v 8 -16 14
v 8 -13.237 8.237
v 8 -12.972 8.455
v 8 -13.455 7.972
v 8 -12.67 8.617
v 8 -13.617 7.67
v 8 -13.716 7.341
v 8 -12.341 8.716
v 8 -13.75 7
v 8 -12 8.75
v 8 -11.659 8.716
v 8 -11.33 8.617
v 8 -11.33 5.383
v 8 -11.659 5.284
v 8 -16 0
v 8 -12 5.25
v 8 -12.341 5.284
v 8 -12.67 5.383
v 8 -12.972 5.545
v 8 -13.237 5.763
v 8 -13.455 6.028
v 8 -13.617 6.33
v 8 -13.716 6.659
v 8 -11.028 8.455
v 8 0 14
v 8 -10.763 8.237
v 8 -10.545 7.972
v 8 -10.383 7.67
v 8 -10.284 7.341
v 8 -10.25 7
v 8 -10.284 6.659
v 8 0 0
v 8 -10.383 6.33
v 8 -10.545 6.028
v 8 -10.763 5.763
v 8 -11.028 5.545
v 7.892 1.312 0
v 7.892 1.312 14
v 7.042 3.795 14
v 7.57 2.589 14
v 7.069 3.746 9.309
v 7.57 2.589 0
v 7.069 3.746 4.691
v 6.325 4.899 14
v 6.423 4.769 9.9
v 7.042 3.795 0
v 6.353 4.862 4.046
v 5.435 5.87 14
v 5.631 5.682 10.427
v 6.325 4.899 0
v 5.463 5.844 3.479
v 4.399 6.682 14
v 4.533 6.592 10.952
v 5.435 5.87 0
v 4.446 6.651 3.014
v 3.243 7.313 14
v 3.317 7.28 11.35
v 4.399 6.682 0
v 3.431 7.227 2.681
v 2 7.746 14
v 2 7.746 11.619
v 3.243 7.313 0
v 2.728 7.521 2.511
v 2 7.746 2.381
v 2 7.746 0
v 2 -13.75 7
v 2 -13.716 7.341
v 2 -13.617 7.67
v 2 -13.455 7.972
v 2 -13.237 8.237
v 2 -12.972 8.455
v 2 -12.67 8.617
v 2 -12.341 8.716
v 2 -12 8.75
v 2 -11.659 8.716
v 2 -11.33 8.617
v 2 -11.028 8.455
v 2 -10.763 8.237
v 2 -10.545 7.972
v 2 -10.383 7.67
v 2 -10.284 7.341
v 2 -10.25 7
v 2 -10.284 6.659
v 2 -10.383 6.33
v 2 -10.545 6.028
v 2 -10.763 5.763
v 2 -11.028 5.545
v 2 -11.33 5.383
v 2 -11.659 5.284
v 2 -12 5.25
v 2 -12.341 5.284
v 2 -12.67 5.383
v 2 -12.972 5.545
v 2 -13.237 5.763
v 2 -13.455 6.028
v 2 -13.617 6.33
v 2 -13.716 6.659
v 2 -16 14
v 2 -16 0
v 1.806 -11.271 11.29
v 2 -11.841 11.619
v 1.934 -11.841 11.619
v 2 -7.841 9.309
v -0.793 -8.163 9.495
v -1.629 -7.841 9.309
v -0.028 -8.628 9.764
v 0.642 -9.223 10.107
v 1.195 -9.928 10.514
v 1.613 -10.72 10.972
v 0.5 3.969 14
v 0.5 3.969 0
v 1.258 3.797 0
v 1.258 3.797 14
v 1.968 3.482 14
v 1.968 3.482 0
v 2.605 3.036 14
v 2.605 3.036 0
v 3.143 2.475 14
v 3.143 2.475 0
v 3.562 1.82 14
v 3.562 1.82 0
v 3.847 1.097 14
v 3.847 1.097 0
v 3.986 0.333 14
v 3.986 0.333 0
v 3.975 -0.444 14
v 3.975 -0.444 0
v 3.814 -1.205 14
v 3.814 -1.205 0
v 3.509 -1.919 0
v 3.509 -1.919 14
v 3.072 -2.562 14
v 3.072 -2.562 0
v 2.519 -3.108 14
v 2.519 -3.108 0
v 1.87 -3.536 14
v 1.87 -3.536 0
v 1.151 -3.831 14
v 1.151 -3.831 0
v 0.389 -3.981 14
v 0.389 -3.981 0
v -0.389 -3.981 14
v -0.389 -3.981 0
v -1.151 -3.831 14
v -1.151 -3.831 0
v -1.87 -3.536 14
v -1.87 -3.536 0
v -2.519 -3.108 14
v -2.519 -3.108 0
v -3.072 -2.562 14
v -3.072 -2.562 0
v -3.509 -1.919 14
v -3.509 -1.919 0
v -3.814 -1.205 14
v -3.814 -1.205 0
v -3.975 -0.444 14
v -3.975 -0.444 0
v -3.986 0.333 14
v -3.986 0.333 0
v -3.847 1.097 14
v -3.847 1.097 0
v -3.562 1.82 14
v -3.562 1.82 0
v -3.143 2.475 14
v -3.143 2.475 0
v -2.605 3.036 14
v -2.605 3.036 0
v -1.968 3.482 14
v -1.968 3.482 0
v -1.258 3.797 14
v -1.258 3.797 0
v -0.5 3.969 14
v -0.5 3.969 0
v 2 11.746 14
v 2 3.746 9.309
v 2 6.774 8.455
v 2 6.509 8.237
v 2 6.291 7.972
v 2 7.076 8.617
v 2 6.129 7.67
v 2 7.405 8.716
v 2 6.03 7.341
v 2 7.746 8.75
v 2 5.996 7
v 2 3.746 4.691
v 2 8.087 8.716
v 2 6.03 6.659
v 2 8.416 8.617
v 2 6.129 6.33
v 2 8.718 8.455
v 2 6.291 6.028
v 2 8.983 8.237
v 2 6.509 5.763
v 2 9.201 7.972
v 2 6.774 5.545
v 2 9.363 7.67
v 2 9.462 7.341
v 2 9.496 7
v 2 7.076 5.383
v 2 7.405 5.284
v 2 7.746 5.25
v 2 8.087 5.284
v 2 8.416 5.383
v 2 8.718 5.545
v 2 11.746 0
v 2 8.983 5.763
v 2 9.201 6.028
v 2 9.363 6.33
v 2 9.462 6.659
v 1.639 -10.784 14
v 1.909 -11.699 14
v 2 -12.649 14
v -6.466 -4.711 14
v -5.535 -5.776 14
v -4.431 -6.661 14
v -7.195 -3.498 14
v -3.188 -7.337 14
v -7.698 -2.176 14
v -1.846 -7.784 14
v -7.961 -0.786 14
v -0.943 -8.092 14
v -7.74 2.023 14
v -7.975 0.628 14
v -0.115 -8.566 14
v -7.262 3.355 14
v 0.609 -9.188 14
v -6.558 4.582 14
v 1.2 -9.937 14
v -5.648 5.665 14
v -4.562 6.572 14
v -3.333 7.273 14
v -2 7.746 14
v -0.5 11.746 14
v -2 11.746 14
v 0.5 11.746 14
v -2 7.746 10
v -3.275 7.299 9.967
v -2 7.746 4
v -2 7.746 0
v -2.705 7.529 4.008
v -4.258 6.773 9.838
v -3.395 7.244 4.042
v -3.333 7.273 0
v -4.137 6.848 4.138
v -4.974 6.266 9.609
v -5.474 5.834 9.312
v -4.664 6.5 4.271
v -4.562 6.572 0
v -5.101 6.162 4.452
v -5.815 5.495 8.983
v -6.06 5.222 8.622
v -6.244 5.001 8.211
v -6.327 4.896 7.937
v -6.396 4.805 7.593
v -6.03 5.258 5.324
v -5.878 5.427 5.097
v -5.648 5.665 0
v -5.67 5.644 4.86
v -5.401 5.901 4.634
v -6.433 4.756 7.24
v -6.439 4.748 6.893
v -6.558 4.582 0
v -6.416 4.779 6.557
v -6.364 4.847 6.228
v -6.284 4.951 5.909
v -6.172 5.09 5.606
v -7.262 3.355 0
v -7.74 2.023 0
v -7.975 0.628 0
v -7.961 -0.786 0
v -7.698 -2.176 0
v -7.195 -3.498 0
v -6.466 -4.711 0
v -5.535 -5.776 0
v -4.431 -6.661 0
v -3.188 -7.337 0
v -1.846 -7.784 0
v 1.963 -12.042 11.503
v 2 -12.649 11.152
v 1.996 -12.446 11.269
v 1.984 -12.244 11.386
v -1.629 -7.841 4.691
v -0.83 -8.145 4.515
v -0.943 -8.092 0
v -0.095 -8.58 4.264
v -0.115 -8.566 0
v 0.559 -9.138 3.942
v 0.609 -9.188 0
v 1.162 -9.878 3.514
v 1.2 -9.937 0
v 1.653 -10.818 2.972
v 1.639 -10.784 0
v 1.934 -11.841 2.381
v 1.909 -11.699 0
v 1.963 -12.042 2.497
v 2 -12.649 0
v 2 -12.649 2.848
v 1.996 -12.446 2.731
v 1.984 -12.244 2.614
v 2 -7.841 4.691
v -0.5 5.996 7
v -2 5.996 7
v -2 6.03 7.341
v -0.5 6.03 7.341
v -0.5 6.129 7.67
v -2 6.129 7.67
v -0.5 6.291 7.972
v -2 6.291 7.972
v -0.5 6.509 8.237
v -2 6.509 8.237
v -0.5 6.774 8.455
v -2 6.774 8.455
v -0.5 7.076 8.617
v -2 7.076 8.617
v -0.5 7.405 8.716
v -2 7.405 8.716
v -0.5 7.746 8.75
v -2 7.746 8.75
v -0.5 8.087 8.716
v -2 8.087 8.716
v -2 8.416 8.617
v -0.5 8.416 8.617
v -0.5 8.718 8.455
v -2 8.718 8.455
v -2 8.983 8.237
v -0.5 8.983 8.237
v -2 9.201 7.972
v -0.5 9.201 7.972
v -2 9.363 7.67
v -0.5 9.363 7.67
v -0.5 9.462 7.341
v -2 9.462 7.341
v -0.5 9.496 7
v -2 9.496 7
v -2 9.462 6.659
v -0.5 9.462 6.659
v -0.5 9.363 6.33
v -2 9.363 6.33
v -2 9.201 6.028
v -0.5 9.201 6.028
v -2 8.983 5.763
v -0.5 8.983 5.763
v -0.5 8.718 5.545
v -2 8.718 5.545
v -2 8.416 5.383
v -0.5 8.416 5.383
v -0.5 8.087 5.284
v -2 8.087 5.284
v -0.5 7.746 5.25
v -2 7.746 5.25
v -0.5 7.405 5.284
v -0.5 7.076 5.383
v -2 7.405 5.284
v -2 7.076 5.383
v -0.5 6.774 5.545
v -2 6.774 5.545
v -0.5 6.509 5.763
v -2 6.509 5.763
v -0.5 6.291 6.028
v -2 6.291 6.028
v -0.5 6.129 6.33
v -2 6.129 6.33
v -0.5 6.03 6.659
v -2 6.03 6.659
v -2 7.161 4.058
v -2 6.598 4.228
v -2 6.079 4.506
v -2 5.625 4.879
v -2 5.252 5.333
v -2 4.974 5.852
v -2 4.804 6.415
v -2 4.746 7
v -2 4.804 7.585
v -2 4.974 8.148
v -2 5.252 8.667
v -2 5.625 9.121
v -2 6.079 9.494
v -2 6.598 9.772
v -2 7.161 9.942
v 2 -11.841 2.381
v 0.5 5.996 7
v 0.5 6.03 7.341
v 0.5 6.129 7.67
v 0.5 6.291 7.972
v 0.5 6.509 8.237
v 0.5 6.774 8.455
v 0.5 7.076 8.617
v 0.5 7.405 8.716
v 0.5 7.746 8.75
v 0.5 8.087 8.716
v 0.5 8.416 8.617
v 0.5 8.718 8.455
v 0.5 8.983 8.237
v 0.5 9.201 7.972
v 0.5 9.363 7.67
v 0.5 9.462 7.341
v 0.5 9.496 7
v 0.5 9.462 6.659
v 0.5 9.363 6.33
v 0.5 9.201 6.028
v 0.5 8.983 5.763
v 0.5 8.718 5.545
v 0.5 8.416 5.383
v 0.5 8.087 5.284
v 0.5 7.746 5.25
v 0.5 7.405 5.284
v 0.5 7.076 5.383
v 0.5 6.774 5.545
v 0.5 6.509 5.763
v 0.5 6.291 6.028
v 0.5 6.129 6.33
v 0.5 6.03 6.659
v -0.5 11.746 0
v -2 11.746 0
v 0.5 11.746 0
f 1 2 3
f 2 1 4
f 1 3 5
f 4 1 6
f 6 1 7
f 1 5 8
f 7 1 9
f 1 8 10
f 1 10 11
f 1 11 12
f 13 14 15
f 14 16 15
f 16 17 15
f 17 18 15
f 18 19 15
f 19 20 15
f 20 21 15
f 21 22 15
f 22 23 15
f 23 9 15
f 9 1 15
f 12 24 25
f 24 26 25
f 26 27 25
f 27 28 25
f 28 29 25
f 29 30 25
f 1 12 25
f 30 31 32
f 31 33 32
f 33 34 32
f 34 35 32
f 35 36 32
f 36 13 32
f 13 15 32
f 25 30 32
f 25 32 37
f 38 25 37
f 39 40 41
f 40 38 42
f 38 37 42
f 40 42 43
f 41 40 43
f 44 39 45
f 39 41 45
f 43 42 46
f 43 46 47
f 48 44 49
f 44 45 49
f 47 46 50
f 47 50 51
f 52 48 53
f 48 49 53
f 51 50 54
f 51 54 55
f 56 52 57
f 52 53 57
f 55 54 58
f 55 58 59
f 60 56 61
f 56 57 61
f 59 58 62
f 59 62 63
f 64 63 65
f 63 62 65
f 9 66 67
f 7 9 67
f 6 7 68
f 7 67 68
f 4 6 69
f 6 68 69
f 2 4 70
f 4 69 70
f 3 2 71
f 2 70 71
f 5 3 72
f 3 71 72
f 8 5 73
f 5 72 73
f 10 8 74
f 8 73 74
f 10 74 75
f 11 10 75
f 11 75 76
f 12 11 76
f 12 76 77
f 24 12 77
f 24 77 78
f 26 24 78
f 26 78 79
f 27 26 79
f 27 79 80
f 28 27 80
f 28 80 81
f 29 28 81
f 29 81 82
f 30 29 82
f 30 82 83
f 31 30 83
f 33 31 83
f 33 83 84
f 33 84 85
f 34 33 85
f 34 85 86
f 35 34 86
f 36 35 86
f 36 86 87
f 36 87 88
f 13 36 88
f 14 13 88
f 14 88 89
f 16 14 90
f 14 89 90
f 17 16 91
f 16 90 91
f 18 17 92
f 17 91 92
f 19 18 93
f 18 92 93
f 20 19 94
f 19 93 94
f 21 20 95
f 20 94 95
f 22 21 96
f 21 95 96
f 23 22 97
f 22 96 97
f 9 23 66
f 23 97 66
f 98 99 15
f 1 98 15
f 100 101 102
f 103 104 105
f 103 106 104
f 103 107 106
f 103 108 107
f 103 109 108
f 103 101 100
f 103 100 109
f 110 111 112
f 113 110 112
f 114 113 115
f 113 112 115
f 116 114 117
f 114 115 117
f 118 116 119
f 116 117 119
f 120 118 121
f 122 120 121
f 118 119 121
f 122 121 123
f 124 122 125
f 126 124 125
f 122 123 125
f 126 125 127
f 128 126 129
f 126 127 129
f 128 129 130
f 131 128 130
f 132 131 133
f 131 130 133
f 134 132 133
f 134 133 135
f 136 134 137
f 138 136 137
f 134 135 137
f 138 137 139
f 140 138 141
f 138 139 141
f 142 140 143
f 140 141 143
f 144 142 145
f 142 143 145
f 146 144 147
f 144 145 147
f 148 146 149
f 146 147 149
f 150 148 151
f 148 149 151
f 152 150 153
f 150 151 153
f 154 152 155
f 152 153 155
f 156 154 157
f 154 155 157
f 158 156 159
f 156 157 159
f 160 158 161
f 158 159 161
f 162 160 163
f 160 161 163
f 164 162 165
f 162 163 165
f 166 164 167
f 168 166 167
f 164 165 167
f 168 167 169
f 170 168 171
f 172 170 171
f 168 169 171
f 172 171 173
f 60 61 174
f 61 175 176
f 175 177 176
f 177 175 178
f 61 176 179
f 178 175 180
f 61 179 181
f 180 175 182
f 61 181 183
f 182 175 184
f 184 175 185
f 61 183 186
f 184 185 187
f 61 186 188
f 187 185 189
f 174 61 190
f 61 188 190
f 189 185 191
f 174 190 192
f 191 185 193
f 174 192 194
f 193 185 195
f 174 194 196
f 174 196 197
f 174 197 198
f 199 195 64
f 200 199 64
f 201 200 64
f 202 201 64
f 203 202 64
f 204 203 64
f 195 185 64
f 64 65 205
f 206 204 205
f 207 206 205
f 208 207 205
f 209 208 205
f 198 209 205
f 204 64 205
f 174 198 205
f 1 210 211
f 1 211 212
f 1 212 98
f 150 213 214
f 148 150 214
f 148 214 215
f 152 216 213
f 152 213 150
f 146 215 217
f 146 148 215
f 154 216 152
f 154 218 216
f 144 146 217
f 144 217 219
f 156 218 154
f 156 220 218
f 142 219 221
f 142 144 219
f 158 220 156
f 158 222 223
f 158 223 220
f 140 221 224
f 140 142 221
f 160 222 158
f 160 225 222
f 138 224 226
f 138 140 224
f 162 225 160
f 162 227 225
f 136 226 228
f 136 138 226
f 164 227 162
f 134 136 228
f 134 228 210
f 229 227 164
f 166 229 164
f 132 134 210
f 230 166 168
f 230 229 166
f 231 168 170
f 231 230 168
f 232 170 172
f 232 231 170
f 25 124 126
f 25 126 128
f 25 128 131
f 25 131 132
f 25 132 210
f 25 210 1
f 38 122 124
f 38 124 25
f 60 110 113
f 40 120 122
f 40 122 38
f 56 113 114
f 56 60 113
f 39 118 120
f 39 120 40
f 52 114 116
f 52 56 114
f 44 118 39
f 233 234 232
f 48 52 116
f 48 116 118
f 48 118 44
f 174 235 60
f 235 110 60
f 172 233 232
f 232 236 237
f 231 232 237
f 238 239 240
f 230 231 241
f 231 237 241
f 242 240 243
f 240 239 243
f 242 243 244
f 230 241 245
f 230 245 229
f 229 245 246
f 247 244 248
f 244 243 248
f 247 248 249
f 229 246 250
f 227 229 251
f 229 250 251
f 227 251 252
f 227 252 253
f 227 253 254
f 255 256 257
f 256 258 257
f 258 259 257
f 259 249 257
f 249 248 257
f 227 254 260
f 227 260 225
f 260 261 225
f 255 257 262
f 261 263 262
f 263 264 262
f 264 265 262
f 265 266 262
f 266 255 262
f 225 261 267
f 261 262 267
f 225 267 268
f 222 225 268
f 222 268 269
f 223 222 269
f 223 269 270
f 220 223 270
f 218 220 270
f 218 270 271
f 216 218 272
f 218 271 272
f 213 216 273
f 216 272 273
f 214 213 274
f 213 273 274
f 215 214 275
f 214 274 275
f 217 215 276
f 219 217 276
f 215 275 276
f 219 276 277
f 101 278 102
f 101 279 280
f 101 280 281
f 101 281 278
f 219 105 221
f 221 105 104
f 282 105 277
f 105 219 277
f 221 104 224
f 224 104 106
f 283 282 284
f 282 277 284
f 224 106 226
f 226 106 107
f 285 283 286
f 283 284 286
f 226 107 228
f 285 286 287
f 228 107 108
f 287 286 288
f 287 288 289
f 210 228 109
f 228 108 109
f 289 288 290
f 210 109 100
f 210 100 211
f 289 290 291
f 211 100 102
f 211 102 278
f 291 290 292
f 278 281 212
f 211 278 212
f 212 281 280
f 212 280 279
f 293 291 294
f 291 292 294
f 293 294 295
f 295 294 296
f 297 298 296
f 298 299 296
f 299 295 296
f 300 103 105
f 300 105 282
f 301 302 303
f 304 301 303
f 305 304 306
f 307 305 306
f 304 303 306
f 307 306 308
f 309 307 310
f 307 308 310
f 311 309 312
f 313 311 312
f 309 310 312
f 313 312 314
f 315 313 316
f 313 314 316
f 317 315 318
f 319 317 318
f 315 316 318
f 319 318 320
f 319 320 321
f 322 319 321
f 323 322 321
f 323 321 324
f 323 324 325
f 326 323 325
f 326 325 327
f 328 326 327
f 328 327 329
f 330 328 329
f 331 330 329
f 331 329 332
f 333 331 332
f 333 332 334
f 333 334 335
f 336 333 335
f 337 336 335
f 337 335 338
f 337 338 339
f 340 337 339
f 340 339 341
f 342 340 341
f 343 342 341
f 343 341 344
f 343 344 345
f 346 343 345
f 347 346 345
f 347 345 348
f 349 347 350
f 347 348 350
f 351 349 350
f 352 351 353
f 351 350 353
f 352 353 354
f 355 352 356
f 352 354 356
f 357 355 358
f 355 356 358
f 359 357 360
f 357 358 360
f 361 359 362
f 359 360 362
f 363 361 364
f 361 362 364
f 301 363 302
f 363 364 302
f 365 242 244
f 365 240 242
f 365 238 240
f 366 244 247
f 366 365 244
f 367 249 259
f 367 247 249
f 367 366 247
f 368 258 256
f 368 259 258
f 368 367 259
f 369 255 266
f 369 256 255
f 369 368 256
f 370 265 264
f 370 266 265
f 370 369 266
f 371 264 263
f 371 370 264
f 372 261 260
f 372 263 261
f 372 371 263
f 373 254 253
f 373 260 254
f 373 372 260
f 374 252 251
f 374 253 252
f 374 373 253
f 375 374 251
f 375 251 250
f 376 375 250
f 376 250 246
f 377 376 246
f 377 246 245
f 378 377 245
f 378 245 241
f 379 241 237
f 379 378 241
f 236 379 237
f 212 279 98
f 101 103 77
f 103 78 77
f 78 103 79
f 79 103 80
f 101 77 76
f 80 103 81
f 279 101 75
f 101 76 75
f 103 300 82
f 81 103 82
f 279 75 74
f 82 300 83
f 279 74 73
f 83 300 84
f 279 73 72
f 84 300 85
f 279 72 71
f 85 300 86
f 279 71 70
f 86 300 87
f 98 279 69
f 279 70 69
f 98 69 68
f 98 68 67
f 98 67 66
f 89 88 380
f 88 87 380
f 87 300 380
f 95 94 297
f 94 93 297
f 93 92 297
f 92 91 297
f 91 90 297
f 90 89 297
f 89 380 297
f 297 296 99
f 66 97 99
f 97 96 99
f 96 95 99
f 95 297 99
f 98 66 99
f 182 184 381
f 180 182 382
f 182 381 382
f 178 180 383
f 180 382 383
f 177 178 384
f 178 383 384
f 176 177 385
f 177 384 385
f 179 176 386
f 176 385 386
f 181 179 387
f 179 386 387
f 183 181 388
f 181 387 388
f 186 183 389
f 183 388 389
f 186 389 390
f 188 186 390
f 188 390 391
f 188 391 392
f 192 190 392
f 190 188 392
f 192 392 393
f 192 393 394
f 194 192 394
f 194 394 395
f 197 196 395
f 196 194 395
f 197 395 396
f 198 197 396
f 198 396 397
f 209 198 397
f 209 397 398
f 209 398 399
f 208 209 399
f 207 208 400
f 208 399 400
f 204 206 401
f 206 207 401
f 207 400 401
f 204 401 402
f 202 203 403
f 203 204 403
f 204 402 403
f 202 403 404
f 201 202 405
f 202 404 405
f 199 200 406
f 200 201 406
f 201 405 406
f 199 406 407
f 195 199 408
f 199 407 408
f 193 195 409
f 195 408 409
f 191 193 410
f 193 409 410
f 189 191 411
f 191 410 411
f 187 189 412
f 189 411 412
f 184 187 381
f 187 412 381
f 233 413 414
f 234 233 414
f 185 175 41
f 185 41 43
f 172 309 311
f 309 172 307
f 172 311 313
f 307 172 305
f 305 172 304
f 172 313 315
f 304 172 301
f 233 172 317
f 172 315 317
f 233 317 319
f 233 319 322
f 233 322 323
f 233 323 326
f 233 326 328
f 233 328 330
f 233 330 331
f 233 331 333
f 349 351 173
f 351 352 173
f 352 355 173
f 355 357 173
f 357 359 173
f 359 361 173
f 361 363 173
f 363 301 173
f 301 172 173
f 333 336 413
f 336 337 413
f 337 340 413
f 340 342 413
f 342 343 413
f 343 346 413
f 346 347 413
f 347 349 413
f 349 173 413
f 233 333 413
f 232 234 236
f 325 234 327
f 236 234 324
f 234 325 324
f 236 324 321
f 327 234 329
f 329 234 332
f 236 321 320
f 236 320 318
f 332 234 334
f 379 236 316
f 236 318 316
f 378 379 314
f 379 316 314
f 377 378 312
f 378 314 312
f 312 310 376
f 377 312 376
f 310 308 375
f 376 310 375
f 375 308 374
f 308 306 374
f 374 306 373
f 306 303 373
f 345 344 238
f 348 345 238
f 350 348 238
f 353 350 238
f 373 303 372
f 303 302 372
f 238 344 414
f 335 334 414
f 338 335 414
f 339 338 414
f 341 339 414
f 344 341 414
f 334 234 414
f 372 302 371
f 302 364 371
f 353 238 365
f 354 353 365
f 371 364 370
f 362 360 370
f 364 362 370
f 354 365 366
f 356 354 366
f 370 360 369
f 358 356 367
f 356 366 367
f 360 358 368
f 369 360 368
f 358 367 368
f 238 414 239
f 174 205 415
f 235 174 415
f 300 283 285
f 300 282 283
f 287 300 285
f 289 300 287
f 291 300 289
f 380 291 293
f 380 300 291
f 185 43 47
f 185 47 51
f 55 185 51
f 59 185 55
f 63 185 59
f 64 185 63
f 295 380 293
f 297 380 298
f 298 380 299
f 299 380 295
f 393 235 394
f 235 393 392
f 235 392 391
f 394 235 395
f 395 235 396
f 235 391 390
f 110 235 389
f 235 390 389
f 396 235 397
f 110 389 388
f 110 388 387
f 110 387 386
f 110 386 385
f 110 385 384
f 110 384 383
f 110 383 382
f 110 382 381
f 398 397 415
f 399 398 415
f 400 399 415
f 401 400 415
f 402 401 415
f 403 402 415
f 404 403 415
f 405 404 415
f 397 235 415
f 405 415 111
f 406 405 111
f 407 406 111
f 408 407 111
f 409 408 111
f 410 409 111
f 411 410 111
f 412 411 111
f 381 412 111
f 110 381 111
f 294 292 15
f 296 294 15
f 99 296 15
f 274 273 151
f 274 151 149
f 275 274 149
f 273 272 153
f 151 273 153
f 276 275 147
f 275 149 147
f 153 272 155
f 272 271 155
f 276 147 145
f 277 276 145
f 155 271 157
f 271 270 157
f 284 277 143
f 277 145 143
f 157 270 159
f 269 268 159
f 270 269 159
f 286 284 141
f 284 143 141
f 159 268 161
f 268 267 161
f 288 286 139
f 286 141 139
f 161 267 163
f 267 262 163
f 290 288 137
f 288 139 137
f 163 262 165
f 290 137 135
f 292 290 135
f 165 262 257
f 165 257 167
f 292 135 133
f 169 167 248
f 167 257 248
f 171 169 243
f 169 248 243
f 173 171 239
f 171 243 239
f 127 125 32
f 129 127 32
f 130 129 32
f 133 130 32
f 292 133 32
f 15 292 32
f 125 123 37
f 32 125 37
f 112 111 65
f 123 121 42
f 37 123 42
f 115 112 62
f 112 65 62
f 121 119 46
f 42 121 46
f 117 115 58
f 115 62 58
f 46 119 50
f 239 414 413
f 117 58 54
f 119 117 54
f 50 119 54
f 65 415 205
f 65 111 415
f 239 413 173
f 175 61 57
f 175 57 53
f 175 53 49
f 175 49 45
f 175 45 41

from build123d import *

# Parameters (mm, degrees)
F1_DEPTH  = 14
F2_R      = 3
F3_DEPTH  = 6.001
F4_R      = 1.75
F5_DEPTH  = 10.001
F7_DEPTH  = 6.0010001
F8_R      = 1.75
F9_DEPTH  = 6.001
F11_DEPTH = 10.0010001


with BuildPart() as f1:
    # F0 (on Top) → F1 (new body)
    with BuildSketch(Plane.XY):
        with BuildLine():
            Line((0.5, 11.7459666924), (0.5, 3.9686269666))
            ThreePointArc((0.5, 3.9686269666), (0, -4), (-0.5, 3.9686269666))
            Line((-0.5, 3.9686269666), (-0.5, 11.7459666924))
            Line((-0.5, 11.7459666924), (-2, 11.7459666924))
            Line((-2, 11.7459666924), (-2, 7.7459666924))
            ThreePointArc((-2, 7.7459666924), (-7.9996074848, -0.0792470114), (-1.8461538462, -7.7840680866))
            ThreePointArc((-1.8461538462, -7.7840680866), (0.9223227028, -9.5482422759), (2, -12.6491106407))
            Line((2, -12.6491106407), (2, -16))
            Line((2, -16), (8, -16))
            Line((8, -16), (8, 0))
            ThreePointArc((8, 0), (6.3245553203, 4.8989794856), (2, 7.7459666924))
            Line((2, 7.7459666924), (2, 11.7459666924))
            Line((2, 11.7459666924), (0.5, 11.7459666924))
        make_face()
    extrude(amount=F1_DEPTH)

    # F2 (on face) → F3 (cut, through all)
    with BuildSketch(Plane(origin=(-2, 0, 0), x_dir=(0, -1, 0), z_dir=(-1, 0, 0))):
        with Locations((-7.7459666924, 7)):
            Circle(F2_R)
    extrude(amount=F3_DEPTH, mode=Mode.SUBTRACT)

    # F4 (on face) → F5 (cut, through all)
    with BuildSketch(Plane(origin=(-2, 0, 0), x_dir=(0, -1, 0), z_dir=(-1, 0, 0))):
        with Locations((-7.7459666924, 7)):
            Circle(F4_R)
    extrude(amount=-F5_DEPTH, mode=Mode.SUBTRACT)

    # F6 (on face) → F7 (cut, through all)
    with BuildSketch(Plane.YZ.offset(2)):
        Polygon((3.7459666924, 4.6905989232), (7.7459666924, 2.3811978465), (11.7459666924, 4.6905989232), (11.7459666924, 9.3094010768), (7.7459666924, 11.6188021535), (3.7459666924, 9.3094010768), align=None)
    extrude(amount=F7_DEPTH, mode=Mode.SUBTRACT)

    # F8 (on face) → F9 (cut, through all)
    with BuildSketch(Plane(origin=(2, 0, 0), x_dir=(0, -1, 0), z_dir=(-1, 0, 0))):
        with Locations((12, 7)):
            Circle(F8_R)
    extrude(amount=-F9_DEPTH, mode=Mode.SUBTRACT)

    # F10 (on face) → F11 (cut, through all)
    with BuildSketch(Plane(origin=(2, 0, 0), x_dir=(0, -1, 0), z_dir=(-1, 0, 0))):
        Polygon((15.8407900553, 9.3094010768), (11.8407900553, 11.6188021535), (7.8407900553, 9.3094010768), (7.8407900553, 4.6905989232), (11.8407900553, 2.3811978465), (15.8407900553, 4.6905989232), align=None)
    extrude(amount=F11_DEPTH, mode=Mode.SUBTRACT)


solid = f1.part
